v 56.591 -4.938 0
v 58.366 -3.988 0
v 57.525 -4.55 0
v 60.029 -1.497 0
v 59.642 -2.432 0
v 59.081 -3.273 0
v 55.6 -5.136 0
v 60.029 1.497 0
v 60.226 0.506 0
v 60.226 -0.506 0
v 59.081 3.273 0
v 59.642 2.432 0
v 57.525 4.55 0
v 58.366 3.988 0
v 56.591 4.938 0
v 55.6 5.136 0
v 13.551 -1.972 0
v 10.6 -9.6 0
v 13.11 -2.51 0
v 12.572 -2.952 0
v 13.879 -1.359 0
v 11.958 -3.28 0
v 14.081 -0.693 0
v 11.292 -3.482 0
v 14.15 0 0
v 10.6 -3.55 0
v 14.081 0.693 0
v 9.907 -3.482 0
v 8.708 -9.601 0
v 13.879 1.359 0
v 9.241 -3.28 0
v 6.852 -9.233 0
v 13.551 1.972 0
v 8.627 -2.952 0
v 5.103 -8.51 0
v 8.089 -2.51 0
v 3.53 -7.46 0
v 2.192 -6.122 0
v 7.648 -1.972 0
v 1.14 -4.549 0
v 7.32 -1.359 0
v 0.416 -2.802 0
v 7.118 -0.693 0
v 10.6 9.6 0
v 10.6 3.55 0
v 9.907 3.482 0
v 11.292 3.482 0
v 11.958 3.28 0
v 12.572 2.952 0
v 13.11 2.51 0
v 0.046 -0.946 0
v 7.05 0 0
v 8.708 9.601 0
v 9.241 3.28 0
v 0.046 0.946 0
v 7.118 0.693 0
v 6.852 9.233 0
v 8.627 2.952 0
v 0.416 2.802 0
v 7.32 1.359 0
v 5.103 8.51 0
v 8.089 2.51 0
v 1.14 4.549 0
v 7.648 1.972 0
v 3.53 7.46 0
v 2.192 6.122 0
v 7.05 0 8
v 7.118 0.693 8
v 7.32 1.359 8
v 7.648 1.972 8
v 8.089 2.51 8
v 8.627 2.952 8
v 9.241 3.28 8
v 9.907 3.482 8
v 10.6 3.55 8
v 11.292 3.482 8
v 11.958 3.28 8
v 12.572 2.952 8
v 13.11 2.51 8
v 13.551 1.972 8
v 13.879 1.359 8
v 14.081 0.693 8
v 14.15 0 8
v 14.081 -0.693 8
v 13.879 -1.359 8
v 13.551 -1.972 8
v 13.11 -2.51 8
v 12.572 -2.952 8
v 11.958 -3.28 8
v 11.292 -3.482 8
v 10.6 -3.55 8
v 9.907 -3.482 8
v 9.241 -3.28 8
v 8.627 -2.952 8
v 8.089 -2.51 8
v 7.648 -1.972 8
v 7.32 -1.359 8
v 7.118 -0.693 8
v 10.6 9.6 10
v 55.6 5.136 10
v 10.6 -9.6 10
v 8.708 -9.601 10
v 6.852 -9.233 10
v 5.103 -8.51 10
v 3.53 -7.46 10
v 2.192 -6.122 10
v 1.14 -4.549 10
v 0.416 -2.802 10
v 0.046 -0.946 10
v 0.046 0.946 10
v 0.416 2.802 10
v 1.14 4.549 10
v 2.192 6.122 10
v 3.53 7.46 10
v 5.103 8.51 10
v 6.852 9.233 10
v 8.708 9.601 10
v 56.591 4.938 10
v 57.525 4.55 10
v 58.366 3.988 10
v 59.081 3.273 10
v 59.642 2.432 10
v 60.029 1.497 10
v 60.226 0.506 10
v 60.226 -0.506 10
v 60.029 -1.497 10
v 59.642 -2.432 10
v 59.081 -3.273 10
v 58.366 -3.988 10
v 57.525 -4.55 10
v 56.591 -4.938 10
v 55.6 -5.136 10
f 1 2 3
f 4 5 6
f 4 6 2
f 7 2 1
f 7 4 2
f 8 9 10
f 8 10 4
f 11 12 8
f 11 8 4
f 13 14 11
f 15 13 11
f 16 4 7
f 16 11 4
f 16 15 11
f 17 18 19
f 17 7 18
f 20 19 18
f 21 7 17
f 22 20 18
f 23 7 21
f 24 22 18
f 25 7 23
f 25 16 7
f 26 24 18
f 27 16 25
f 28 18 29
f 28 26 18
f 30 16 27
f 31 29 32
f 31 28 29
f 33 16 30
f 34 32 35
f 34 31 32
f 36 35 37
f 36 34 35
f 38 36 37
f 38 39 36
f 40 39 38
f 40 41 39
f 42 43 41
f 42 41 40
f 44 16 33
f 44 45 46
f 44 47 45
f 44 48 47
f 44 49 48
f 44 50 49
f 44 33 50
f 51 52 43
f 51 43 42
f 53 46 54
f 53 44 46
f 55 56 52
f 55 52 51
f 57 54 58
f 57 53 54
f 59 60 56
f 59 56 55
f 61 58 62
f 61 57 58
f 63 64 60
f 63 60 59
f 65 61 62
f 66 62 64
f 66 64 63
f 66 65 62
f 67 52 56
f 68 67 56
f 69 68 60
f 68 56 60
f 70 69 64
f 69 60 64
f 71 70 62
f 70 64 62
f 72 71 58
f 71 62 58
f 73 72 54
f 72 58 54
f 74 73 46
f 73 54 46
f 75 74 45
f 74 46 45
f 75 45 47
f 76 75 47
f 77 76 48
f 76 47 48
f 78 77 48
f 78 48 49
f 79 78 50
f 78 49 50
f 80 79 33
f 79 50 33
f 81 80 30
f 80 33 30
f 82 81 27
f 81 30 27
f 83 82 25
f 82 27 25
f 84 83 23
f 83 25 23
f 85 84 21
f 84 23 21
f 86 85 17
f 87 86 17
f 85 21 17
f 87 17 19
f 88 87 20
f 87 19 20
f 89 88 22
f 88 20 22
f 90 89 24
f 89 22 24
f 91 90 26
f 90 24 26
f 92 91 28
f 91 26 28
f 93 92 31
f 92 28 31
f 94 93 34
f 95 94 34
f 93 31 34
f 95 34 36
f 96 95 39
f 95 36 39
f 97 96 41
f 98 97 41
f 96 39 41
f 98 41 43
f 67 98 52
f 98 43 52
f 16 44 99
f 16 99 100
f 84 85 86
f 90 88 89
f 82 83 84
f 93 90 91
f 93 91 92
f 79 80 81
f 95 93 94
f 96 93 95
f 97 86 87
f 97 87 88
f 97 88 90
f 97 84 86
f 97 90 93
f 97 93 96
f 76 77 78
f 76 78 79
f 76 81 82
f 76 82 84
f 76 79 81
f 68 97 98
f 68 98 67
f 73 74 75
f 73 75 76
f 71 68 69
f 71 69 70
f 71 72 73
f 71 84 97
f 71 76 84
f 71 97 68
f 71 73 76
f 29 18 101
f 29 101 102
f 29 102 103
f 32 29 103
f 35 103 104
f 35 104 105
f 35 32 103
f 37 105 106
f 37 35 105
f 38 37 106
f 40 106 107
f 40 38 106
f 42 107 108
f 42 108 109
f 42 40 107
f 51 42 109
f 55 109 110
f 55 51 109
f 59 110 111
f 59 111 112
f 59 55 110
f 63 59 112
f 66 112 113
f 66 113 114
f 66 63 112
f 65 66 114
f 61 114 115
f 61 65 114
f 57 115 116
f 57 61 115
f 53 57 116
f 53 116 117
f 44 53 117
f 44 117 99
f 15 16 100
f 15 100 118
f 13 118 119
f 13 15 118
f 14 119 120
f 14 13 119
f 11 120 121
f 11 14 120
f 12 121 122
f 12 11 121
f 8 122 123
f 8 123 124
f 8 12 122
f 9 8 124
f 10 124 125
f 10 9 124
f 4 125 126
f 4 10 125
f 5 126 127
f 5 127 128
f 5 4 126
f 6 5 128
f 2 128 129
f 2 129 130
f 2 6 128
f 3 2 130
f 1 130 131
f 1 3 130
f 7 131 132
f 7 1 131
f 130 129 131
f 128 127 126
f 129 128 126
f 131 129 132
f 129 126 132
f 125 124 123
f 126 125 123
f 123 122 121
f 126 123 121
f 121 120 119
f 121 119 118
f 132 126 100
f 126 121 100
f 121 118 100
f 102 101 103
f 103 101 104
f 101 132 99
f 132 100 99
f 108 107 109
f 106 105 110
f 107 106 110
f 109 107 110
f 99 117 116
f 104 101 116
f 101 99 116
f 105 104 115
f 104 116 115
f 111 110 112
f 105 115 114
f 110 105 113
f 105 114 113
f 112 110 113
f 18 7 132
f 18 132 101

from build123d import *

# Parameters (mm, degrees)
BOSS_EXTRU_1_DEPTH = 10
SKETCH1_R          = 3.55
CUT_EXTRUDE1_DEPTH = 8


with BuildPart() as part:
    # Esquisse1 → Boss.-Extru.1 (new body)
    with BuildSketch(Plane.XY):
        with BuildLine():
            Line((10.599509188, 9.6), (55.599509188, 5.135702408))
            ThreePointArc((55.599509188, 5.135702408), (60.250926744, 0), (55.599509188, -5.135702408))
            Line((55.599509188, -5.135702408), (10.599509188, -9.6))
            ThreePointArc((10.599509188, -9.6), (0, 0), (10.599509188, 9.6))
        make_face()
    extrude(amount=BOSS_EXTRU_1_DEPTH)

    # Sketch1 → Cut-Extrude1 (cut)
    with BuildSketch(Plane(origin=(0, 0, 0), x_dir=(-1, 0, 0), z_dir=(0, 0, -1))):
        with Locations((-10.599509188, 0)):
            Circle(SKETCH1_R)
    extrude(amount=-CUT_EXTRUDE1_DEPTH, mode=Mode.SUBTRACT)


solid = part.part
